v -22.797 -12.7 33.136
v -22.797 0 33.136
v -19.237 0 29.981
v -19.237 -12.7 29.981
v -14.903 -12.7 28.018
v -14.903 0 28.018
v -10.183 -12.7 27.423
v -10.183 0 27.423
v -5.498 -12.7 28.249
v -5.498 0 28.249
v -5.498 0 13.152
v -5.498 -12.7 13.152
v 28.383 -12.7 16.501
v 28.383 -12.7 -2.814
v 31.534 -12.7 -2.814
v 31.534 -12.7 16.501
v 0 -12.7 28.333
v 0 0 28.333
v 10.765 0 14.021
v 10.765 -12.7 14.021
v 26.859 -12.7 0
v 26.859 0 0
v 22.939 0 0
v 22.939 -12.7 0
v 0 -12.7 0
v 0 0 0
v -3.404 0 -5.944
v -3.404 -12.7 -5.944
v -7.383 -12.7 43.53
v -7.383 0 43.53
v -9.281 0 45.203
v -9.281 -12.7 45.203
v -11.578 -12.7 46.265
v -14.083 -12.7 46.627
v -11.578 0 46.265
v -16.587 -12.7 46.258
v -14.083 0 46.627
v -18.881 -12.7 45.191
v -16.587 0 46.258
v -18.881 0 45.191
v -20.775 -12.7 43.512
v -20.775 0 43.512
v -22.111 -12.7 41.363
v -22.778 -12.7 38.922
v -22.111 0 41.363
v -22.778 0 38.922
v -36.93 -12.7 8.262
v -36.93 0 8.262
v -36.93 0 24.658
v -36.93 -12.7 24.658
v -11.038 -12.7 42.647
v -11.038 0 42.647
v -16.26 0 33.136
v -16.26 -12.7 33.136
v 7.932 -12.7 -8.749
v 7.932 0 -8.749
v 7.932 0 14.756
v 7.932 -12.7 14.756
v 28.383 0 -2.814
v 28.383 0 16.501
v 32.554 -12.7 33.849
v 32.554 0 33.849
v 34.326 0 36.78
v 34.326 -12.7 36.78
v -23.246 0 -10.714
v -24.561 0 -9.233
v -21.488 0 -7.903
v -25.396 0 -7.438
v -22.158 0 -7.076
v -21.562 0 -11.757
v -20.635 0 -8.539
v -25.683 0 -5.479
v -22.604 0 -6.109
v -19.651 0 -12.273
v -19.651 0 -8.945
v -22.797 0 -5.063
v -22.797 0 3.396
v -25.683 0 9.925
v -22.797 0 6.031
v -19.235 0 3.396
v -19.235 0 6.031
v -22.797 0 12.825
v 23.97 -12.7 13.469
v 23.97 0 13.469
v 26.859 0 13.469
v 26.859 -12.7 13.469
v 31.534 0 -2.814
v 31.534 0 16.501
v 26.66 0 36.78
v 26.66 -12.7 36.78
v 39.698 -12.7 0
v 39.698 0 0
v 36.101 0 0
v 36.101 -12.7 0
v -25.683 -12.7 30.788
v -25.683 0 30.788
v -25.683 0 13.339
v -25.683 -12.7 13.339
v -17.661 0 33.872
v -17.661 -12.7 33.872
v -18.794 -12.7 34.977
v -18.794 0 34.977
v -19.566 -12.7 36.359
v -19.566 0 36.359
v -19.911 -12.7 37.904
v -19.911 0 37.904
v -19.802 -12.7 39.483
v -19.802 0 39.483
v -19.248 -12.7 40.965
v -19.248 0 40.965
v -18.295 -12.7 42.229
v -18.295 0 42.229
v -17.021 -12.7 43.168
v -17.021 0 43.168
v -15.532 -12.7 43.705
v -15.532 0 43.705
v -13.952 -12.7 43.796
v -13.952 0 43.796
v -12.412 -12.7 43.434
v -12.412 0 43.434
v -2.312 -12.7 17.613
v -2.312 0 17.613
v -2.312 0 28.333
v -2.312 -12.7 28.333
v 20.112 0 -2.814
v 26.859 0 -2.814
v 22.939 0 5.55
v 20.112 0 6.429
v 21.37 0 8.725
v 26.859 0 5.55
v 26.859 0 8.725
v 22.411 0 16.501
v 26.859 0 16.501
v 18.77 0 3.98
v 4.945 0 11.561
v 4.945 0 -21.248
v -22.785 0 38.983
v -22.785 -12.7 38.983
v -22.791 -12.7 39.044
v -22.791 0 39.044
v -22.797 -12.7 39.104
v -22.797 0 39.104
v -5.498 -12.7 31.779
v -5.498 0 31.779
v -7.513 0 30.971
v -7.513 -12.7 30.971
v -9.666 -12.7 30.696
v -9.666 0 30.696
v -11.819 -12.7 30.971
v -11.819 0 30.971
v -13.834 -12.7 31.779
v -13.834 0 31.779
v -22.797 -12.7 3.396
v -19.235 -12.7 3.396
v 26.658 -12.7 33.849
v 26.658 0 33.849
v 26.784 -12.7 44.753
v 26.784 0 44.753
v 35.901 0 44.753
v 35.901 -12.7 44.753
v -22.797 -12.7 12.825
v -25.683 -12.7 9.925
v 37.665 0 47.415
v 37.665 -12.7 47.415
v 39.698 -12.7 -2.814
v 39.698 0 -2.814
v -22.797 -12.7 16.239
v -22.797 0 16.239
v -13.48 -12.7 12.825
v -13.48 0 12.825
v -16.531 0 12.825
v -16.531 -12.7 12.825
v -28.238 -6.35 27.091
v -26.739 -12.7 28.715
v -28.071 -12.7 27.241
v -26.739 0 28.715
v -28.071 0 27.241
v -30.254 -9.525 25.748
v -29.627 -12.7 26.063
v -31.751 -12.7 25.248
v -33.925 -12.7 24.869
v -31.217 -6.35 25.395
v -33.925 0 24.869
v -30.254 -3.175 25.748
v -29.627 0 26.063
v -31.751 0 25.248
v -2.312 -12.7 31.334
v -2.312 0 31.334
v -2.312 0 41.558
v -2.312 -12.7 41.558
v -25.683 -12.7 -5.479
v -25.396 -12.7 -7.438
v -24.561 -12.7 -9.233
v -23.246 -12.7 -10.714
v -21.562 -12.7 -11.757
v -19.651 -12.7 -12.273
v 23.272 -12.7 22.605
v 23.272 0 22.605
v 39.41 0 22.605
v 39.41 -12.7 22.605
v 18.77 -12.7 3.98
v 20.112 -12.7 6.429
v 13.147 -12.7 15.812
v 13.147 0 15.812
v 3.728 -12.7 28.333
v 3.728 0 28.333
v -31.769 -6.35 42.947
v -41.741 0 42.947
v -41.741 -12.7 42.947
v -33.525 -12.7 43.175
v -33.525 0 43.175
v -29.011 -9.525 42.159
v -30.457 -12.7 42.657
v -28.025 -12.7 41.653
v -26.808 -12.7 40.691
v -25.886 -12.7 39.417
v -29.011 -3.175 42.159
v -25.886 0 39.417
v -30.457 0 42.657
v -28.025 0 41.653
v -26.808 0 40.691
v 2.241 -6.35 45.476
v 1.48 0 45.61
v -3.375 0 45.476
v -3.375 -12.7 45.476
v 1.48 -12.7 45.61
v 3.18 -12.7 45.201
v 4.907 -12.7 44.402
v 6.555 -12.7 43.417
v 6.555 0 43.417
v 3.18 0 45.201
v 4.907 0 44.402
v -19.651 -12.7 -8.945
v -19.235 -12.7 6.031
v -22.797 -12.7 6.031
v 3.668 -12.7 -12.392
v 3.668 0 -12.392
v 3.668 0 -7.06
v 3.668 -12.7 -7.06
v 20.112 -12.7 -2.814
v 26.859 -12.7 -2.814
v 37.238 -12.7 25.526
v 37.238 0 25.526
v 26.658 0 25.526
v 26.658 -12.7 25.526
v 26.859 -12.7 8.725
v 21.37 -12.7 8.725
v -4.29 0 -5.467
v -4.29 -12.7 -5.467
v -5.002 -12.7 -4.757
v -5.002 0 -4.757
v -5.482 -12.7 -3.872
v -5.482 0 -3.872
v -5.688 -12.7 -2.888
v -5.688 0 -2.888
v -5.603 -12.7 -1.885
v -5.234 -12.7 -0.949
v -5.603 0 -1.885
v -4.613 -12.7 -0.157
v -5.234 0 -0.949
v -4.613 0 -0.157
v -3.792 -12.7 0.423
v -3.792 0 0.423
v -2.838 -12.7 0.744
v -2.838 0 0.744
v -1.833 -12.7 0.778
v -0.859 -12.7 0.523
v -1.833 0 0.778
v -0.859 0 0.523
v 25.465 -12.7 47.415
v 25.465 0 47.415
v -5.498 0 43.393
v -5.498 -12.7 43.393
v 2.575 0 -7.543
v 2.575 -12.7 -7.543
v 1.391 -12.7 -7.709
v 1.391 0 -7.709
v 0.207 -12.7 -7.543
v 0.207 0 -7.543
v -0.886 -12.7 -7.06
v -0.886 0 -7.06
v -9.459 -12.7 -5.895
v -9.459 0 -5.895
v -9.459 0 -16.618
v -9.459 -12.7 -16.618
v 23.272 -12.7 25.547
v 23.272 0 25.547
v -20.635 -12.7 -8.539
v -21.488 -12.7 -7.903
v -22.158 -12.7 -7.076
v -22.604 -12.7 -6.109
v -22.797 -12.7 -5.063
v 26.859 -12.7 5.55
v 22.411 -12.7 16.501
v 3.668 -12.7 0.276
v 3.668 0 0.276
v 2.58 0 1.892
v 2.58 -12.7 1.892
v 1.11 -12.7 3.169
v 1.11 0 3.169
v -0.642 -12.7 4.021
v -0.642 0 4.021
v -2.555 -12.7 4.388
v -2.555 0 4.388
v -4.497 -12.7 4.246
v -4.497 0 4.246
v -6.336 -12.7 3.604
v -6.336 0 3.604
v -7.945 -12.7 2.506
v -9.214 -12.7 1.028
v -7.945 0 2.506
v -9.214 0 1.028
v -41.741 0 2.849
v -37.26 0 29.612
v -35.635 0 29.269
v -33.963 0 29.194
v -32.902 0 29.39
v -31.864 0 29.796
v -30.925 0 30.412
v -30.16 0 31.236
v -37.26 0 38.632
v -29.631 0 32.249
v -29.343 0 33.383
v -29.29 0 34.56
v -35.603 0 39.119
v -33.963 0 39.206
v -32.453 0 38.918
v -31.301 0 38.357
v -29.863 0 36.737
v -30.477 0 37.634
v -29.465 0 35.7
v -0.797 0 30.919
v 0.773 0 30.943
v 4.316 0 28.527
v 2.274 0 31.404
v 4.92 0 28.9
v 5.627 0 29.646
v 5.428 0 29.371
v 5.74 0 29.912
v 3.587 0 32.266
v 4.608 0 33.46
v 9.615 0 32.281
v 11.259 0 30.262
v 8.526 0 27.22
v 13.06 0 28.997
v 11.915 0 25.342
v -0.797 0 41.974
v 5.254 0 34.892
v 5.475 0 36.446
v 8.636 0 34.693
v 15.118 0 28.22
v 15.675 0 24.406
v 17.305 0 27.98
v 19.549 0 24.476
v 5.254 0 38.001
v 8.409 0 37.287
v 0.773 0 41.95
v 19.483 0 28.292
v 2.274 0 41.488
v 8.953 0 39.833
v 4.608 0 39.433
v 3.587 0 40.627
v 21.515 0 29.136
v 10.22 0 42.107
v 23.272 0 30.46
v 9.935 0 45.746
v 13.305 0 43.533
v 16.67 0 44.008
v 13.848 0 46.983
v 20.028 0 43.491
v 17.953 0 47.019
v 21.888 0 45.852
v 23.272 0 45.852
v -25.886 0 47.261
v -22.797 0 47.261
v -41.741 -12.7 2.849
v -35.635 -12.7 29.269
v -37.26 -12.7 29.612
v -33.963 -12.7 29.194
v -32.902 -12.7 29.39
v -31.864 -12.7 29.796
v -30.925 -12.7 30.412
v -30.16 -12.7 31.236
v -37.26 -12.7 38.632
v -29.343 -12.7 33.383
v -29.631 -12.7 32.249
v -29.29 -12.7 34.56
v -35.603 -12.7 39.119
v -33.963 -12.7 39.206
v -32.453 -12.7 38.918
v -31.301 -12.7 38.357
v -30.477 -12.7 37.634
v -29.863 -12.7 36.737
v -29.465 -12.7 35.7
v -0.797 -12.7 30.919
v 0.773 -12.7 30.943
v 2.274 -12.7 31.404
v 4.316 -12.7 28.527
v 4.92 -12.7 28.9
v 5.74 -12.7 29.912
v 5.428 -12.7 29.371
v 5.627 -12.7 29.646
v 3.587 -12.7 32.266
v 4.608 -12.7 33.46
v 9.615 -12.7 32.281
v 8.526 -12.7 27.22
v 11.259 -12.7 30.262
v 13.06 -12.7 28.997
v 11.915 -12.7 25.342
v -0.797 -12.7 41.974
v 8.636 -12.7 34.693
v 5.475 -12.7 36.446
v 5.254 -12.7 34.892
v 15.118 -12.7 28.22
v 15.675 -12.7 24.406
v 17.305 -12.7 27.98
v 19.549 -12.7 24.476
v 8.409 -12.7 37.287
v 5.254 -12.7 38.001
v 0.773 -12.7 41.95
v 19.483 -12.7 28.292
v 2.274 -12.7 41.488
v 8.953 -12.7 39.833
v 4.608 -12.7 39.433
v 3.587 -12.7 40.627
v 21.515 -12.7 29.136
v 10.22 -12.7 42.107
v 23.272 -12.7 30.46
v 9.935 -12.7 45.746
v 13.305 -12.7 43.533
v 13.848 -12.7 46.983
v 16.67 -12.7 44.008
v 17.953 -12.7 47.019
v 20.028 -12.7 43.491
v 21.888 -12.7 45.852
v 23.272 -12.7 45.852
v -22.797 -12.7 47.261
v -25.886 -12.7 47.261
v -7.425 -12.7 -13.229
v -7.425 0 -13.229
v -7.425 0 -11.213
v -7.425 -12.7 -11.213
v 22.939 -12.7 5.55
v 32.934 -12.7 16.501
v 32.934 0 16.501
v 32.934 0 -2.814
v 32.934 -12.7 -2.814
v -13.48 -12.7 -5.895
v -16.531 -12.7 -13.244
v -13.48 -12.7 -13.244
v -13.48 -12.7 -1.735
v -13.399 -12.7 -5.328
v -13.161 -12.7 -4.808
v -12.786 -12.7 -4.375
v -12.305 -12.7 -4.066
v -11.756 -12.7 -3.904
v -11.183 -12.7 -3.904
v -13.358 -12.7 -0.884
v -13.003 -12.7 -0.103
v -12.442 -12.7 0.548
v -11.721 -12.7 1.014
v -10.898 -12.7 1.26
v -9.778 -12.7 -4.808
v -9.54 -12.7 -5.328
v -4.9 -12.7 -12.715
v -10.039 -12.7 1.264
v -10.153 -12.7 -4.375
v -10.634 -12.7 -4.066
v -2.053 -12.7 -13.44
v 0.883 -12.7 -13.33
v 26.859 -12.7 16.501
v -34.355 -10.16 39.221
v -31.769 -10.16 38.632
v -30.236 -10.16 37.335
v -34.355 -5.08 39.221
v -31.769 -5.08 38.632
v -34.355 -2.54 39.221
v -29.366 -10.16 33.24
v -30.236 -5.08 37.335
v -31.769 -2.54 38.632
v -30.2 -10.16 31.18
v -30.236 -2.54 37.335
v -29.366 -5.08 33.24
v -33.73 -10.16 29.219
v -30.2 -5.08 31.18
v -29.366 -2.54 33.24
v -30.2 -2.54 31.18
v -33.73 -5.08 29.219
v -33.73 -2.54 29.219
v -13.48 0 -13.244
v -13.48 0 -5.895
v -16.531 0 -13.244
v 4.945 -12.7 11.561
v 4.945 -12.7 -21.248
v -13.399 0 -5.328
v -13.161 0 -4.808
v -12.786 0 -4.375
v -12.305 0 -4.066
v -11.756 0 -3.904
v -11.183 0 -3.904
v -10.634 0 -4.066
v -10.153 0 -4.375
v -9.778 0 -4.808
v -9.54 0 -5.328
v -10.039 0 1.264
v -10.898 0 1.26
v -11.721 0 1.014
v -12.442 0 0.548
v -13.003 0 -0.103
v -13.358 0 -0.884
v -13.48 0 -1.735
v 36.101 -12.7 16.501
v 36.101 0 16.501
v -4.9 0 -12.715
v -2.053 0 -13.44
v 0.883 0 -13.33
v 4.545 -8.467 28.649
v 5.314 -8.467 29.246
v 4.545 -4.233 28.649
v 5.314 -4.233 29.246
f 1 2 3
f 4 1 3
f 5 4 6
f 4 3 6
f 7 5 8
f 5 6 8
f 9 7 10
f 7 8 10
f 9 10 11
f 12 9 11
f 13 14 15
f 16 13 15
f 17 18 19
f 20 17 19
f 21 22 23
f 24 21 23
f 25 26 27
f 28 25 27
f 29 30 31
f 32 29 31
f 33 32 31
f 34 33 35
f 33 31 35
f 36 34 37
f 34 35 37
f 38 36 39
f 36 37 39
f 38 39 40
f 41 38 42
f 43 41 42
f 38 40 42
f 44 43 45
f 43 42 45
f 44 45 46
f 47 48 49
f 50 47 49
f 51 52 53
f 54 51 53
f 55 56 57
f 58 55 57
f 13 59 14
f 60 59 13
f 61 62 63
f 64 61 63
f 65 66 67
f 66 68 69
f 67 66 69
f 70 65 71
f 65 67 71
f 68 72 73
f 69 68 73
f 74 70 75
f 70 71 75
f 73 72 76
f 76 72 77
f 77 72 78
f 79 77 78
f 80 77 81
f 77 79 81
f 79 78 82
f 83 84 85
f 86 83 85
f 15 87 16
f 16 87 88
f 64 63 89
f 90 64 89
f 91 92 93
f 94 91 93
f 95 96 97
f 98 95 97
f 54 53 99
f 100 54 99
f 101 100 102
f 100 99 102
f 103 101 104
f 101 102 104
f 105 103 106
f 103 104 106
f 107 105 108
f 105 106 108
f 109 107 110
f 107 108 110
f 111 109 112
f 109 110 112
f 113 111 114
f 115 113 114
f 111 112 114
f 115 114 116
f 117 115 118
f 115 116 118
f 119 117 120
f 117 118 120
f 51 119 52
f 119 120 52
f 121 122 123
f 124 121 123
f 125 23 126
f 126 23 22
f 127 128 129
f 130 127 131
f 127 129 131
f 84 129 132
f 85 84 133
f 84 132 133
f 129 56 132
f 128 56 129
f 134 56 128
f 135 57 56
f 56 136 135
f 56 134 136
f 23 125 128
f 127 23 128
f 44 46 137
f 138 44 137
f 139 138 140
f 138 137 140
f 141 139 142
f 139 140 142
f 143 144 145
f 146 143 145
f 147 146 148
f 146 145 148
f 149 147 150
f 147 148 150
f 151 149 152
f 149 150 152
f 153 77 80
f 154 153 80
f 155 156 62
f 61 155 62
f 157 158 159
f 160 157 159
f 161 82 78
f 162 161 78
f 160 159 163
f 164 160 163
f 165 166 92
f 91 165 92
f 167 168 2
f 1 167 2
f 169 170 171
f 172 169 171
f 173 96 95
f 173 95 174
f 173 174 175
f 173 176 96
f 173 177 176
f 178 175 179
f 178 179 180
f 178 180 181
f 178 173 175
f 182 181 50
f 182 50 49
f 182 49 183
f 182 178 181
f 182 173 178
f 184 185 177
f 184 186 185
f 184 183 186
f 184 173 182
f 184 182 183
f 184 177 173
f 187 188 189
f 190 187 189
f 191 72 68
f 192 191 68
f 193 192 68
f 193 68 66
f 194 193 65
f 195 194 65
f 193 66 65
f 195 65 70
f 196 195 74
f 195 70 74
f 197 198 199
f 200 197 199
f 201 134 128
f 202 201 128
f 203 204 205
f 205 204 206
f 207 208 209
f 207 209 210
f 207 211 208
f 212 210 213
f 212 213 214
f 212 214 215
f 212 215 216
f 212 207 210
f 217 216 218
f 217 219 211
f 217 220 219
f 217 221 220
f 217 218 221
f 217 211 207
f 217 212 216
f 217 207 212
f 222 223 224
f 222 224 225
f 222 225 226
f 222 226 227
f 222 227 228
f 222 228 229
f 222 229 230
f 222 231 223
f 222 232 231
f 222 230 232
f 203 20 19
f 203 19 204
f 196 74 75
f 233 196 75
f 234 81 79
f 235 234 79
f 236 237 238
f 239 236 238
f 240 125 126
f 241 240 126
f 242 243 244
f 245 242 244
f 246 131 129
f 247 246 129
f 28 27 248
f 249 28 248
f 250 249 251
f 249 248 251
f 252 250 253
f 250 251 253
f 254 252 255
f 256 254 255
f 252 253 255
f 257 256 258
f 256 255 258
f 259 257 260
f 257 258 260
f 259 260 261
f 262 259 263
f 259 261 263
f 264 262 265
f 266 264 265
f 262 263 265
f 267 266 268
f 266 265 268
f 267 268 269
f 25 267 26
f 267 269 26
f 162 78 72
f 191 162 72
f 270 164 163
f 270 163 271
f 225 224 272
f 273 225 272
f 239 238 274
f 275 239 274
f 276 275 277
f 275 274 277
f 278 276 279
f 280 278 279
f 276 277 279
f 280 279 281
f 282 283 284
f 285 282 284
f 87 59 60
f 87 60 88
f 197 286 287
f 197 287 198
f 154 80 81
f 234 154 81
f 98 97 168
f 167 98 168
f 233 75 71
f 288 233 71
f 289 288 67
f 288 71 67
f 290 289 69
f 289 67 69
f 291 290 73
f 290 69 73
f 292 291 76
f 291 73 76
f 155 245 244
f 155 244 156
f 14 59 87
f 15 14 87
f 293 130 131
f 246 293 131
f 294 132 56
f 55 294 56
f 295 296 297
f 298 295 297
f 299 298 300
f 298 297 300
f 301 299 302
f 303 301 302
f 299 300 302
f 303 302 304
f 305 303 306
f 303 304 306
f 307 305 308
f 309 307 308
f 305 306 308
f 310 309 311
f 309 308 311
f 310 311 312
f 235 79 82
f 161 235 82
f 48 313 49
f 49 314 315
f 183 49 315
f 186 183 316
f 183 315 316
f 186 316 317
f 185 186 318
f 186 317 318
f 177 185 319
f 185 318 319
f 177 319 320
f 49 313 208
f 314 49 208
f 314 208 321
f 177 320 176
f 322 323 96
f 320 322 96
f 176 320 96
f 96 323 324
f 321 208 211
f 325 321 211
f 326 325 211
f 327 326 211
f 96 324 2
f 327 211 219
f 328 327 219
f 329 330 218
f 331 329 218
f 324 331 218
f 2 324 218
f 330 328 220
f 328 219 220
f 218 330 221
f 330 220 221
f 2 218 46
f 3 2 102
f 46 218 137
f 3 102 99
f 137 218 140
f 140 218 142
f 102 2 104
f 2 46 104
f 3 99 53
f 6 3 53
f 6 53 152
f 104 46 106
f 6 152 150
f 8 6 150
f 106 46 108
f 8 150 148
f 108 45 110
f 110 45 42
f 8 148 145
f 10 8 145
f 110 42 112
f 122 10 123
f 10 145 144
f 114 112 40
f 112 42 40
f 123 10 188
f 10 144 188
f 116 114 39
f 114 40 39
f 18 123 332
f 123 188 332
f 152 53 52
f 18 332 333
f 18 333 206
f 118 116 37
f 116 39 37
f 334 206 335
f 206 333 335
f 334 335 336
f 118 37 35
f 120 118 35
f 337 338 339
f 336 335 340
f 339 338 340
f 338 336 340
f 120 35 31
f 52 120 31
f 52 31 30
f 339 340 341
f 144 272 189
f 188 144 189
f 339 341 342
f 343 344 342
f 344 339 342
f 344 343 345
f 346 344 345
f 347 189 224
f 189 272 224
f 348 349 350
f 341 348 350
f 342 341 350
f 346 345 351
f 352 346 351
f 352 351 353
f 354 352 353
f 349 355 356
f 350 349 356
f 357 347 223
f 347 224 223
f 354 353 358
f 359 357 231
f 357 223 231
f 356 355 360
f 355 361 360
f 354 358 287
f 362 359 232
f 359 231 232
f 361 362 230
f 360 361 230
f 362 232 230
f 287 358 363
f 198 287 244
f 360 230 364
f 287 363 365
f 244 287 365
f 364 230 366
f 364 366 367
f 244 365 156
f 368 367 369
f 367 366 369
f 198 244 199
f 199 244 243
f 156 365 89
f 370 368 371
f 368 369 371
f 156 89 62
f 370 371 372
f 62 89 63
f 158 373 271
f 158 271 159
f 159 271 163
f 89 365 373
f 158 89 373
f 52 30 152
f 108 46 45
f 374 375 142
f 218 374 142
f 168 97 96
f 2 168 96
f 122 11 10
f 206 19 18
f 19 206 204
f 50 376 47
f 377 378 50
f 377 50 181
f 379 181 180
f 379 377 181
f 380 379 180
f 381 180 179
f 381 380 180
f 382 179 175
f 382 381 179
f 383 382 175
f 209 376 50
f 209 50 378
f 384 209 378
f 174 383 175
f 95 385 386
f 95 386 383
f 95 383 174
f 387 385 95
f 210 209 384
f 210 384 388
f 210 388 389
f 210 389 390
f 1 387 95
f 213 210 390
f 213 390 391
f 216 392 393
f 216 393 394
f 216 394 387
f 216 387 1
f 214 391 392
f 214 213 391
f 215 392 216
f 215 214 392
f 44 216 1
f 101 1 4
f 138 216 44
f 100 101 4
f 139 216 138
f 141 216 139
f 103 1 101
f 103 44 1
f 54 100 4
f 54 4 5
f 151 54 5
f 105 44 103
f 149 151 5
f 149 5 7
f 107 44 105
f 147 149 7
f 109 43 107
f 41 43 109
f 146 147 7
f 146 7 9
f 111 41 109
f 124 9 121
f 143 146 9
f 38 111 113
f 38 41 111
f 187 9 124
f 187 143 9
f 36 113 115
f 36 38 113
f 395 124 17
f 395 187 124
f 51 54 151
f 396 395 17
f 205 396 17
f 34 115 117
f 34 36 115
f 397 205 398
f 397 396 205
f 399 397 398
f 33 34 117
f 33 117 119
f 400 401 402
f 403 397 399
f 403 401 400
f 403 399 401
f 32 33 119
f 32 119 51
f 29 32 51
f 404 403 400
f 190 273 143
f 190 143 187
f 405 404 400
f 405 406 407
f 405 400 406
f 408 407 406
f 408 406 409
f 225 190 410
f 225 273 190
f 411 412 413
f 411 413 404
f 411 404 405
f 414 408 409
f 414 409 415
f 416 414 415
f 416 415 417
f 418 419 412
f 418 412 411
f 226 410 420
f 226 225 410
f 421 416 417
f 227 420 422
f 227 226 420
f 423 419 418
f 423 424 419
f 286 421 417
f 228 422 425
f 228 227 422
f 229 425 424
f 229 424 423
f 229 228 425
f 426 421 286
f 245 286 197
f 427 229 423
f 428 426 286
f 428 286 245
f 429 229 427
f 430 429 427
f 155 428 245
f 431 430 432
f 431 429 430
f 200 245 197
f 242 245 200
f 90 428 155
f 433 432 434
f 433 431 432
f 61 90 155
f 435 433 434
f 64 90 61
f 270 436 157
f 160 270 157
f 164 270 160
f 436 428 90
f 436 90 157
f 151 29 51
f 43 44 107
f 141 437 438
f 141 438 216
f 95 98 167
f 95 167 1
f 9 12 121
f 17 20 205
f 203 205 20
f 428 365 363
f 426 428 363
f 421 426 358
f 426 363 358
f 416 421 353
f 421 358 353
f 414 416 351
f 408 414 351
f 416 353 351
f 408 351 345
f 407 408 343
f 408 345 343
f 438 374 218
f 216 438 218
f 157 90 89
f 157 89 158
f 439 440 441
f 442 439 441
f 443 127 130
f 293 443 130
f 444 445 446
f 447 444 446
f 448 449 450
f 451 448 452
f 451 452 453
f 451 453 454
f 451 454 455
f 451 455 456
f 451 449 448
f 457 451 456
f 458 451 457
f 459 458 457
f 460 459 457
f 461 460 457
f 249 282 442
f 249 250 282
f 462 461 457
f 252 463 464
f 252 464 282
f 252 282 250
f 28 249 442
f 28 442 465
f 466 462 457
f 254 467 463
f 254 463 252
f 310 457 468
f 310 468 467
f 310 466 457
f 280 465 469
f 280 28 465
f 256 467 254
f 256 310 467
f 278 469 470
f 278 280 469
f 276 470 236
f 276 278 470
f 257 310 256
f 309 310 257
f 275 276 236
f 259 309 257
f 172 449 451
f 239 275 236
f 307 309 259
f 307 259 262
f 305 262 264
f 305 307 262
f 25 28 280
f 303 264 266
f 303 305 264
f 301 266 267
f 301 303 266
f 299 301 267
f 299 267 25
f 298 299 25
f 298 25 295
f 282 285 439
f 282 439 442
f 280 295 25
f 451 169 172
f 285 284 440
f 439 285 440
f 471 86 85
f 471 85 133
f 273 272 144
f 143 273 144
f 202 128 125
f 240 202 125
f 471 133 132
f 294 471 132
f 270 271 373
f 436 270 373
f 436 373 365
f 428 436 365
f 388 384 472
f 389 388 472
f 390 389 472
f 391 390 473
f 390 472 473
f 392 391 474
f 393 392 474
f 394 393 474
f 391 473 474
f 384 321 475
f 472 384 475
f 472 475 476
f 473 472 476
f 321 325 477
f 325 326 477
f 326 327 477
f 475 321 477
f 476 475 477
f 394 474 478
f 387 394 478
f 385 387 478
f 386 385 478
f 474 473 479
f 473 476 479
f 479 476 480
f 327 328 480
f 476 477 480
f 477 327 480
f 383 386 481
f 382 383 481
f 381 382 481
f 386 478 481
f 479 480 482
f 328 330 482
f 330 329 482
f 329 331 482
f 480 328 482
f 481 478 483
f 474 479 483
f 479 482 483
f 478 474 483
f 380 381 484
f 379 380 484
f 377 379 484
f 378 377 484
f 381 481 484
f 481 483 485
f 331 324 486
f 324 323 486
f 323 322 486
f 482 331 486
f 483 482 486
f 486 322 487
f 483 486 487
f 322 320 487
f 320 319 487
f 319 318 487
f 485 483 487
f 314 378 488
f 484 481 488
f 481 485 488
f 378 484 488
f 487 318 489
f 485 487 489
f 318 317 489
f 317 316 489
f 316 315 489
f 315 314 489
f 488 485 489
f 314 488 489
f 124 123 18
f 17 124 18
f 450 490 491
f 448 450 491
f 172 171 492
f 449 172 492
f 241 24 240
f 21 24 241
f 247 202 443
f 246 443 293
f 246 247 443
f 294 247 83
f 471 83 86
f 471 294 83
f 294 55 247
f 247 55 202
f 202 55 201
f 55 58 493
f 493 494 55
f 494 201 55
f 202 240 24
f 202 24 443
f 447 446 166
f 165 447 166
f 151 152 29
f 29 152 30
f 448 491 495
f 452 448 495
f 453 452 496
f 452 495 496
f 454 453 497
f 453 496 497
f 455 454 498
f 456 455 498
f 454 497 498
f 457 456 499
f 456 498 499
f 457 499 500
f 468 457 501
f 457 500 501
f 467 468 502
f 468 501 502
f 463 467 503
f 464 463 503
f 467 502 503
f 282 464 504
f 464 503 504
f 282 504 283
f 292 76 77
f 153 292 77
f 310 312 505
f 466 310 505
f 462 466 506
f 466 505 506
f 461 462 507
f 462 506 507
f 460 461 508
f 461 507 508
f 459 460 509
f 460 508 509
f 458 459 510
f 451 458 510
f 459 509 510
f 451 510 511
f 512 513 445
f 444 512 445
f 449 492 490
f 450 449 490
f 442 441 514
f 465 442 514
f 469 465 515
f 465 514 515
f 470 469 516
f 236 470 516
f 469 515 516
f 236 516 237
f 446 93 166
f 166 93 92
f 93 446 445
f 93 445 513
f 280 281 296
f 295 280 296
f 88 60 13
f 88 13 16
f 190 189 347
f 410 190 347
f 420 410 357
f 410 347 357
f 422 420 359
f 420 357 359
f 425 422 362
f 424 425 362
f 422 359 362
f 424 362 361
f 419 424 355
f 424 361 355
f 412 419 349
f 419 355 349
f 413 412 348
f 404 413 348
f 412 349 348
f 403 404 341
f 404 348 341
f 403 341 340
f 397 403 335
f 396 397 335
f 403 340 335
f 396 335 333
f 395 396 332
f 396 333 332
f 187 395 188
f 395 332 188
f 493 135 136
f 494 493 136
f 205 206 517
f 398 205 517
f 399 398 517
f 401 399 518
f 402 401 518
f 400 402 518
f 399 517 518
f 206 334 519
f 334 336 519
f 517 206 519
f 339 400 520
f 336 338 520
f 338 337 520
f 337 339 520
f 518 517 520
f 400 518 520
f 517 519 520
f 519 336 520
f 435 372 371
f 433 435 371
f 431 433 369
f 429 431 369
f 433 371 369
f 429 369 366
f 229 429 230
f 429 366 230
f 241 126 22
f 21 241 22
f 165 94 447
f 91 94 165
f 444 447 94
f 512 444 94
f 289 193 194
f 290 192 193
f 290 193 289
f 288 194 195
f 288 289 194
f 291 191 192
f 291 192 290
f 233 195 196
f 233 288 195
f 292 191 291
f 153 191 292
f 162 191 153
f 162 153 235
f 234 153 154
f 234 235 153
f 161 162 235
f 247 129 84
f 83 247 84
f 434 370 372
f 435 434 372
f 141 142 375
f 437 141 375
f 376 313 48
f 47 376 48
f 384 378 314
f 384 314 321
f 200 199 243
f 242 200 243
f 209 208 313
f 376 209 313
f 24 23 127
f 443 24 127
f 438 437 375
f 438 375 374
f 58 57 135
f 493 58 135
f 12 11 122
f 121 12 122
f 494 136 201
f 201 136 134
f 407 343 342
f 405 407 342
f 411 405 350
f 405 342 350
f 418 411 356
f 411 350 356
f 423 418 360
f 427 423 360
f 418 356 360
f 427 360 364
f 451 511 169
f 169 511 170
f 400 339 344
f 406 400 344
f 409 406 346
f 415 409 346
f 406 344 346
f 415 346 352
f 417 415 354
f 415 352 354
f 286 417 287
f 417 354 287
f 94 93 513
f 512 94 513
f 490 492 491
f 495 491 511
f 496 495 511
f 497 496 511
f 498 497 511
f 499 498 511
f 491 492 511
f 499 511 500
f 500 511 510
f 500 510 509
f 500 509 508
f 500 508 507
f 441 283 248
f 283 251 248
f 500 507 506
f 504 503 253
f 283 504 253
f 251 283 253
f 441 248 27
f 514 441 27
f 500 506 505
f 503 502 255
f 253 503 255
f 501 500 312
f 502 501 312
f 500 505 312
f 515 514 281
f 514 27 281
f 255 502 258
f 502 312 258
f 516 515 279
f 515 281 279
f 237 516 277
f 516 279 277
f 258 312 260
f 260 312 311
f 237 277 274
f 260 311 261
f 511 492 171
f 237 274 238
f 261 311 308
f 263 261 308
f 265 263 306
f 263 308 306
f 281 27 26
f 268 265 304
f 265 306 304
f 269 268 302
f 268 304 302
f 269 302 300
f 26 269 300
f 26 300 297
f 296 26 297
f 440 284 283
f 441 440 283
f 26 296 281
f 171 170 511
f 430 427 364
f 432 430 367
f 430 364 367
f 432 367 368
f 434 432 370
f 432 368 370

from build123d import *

# Parameters (mm, degrees)
F1_DEPTH = 12.7
F0_W     = 3.1512789428
F0_H     = 19.3154485896


# Not quite as in the source:
# - a feature names something its author has since deleted; it is built from what else it names


with BuildPart() as f1:
    # F0 (on Front) → F1 (new body)
    with BuildSketch(Plane.XZ):
        with BuildLine():
            Line((-22.7970443666, 6.0306531377), (-22.7970443666, 12.8252729774))
            Line((-22.7970443666, 12.8252729774), (-25.6827417761, 9.9253003924))
            Line((-25.6827417761, 9.9253003924), (-25.6827417761, -5.4786019027))
            ThreePointArc((-25.6827417761, -5.4786019027), (-23.9571856116, -10.0214915962), (-19.6507833898, -12.273222208))
            Line((-19.6507833898, -12.273222208), (-19.6507833898, -8.9452452958))
            ThreePointArc((-19.6507833898, -8.9452452958), (-21.848929, -7.5103998354), (-22.7970443666, -5.062604323))
            Line((-22.7970443666, -5.062604323), (-22.7970443666, 3.3960044384))
            Line((-22.7970443666, 3.3960044384), (-19.2347858101, 3.3960044384))
            Line((-19.2347858101, 3.3960044384), (-19.2347858101, 6.0306531377))
            Line((-19.2347858101, 6.0306531377), (-22.7970443666, 6.0306531377))
        make_face()
    extrude(amount=F1_DEPTH)


with BuildPart() as f1b:
    # F0 (on Front) → F1, piece 2 (new body)
    with BuildSketch(Plane.XZ):
        with Locations((29.9587789923, 6.84329262)):
            Rectangle(F0_W, F0_H)
    extrude(amount=F1_DEPTH)


with BuildPart() as f1c:
    # F0 (on Front) → F1, piece 3 (new body)
    with BuildSketch(Plane.XZ):
        Polygon((36.1009687185, 16.5010169148), (32.9344682395, 16.5010169148), (32.9344682395, -2.8144316748), (39.6982617676, -2.8144316748), (39.6982617676, 0), (36.1009687185, 0), align=None)
    extrude(amount=F1_DEPTH)


with BuildPart() as f1d:
    # F0 (on Front) → F1, piece 4 (new body)
    with BuildSketch(Plane.XZ):
        Polygon((23.2723504305, 45.8521991968), (23.2723504305, 30.4596498609), (23.2723504305, 25.5465842783), (23.2723504305, 22.6054359227), (39.4099989739, 22.6054359227), (37.2384806324, 25.5261287093), (26.6575552523, 25.5261287093), (26.6575552523, 33.8493175805), (32.5542018329, 33.8493175805), (34.3258168194, 36.7803946137), (26.6601163894, 36.7803946137), (26.783708483, 44.7525680065), (35.9011446557, 44.7525680065), (37.6653889506, 47.4146641791), (25.4651047289, 47.4146641791), align=None)
        with BuildLine():
            ThreePointArc((-22.7784111307, 38.9221281908), (-22.7881290805, 39.0132098974), (-22.7970443666, 39.1043736704))
            Line((-22.7970443666, 39.1043736704), (-22.7970443666, 38.7572443403))
            ThreePointArc((-22.7970443666, 38.7572443403), (-22.7881176358, 38.839730326), (-22.7784111307, 38.9221281908))
        make_face()
        with BuildLine():
            Line((-25.8855894208, 47.2608096898), (-25.8855894208, 39.4166894257))
            add(Edge.make_bspline(
                [(-25.8855894208, 39.4166894257), (-24.6475112984, 37.0445040507), (-24.8416415293, 33.227538681), (-25.6827417761, 30.7881627232)],
                knots=[0.4174478971, 0.4174478971, 0.4174478971, 0.4174478971, 0.6297294882, 0.6297294882, 0.6297294882, 0.6297294882], degree=3))
            Line((-25.6827417761, 30.7881627232), (-25.6827417761, 13.3388286385))
            Line((-25.6827417761, 13.3388286385), (-22.7970443666, 16.2388012235))
            Line((-22.7970443666, 16.2388012235), (-22.7970443666, 33.1357669485))
            Line((-22.7970443666, 33.1357669485), (-22.7970443666, 38.7572443403))
            Line((-22.7970443666, 38.7572443403), (-22.7970443666, 39.1043736704))
            Line((-22.7970443666, 39.1043736704), (-22.7970443666, 47.2608096898))
            Line((-22.7970443666, 47.2608096898), (-25.8855894208, 47.2608096898))
        make_face()
        with BuildLine():
            Line((-5.4981587455, 31.7787639797), (-5.4981587455, 28.2489098608))
            Line((-5.4981587455, 28.2489098608), (-5.4981587455, 13.1524559511))
            Line((-5.4981587455, 13.1524559511), (-2.3118001409, 17.6133587109))
            Line((-2.3118001409, 17.6133587109), (-2.3118001409, 28.3327493817))
            Line((-2.3118001409, 28.3327493817), (0, 28.3327493817))
            Line((0, 28.3327493817), (10.7654773061, 14.0205014217))
            Line((10.7654773061, 14.0205014217), (13.1465570685, 15.8115170761))
            Line((13.1465570685, 15.8115170761), (3.7282572594, 28.3327493817))
            add(Edge.make_bspline(
                [(3.7282572594, 28.3327493817), (4.4697086138, 28.4388605505), (5.583407823, 29.2809382081), (5.7398658246, 29.9119707197)],
                knots=[0, 0, 0, 0, 2.5574418965, 2.5574418965, 2.5574418965, 2.5574418965], degree=3))
            ThreePointArc((5.7398658246, 29.9119707197), (13.7644057738, 24.750415198), (23.2723504305, 25.5465842783))
            Line((23.2723504305, 25.5465842783), (23.2723504305, 30.4596498609))
            ThreePointArc((23.2723504305, 30.4596498609), (17.3050239314, 27.9801992486), (11.2593770027, 30.2620436996))
            ThreePointArc((11.2593770027, 30.2620436996), (8.4255284864, 35.9813750755), (10.2200610563, 42.1068221331))
            ThreePointArc((10.2200610563, 42.1068221331), (14.969664999, 43.8937045235), (20.0282521546, 43.4907376766))
            Line((20.0282521546, 43.4907376766), (21.8875091523, 45.8521991968))
            ThreePointArc((21.8875091523, 45.8521991968), (13.848280603, 46.9825580852), (6.554979831, 43.4167943895))
            add(Edge.make_bspline(
                [(-3.3745283409, 45.4758740962), (-1.4213463889, 45.669322552), (2.3339933507, 46.0412616194), (5.1862192298, 44.2678436312), (6.554979831, 43.4167943895)],
                knots=[0, 0, 0, 0, 0.520107923, 1, 1, 1, 1], degree=3))
            Line((-3.3745283409, 45.4758740962), (-5.4981587455, 43.3934754007))
            Line((-5.4981587455, 43.3934754007), (-5.4981587455, 31.7787639797))
        make_face()
        with BuildLine():
            Line((-2.3118001409, 31.334426254), (-2.3118001409, 41.5583662689))
            ThreePointArc((-2.3118001409, 41.5583662689), (5.4753586279, 36.4463962615), (-2.3118001409, 31.334426254))
        make_face(mode=Mode.SUBTRACT)
        with BuildLine():
            Line((-22.7970443666, 38.7572443403), (-22.7970443666, 33.1357669485))
            ThreePointArc((-22.7970443666, 33.1357669485), (-14.9031259742, 28.0178729436), (-5.4981587455, 28.2489098608))
            Line((-5.4981587455, 28.2489098608), (-5.4981587455, 31.7787639797))
            ThreePointArc((-5.4981587455, 31.7787639797), (-9.6662566066, 30.6964517708), (-13.8343544677, 31.7787639797))
            Line((-13.8343544677, 31.7787639797), (-7.3829540052, 43.5297638178))
            ThreePointArc((-7.3829540052, 43.5297638178), (-16.5867906437, 46.2582932174), (-22.7784111307, 38.9221281908))
            ThreePointArc((-22.7784111307, 38.9221281908), (-22.7881176358, 38.839730326), (-22.7970443666, 38.7572443403))
        make_face()
        with BuildLine():
            ThreePointArc((-16.2602435866, 33.1357669485), (-19.2483695666, 40.9652958819), (-11.0384837145, 42.6470195468))
            Line((-11.0384837145, 42.6470195468), (-16.2602435866, 33.1357669485))
        make_face(mode=Mode.SUBTRACT)
        with BuildLine():
            add(Edge.make_bspline(
                [(-41.7409986258, 42.9465435445), (-38.3140280434, 43.2744605369), (-31.9351392412, 43.6634452288), (-26.9894319336, 41.5316763702), (-25.8855894208, 39.4166894257)],
                knots=[0, 0, 0, 0, 0.2281824212, 0.4174478971, 0.4174478971, 0.4174478971, 0.4174478971], degree=3))
            Line((-41.7409986258, 42.9465435445), (-41.7409986258, 2.8491741978))
            Line((-41.7409986258, 2.8491741978), (-36.929551512, 8.2620496761))
            Line((-36.929551512, 8.2620496761), (-36.929551512, 24.6575884521))
            add(Edge.make_bspline(
                [(-25.6827417761, 30.7881627232), (-26.2896941154, 29.0278672654), (-28.5711016827, 26.5069421654), (-31.2054829086, 24.8549701927), (-36.929551512, 24.6575884521)],
                knots=[0.6297294882, 0.6297294882, 0.6297294882, 0.6297294882, 0.782915519, 1, 1, 1, 1], degree=3))
            add(Edge.make_bspline(
                [(-25.8855894208, 39.4166894257), (-24.6475112984, 37.0445040507), (-24.8416415293, 33.227538681), (-25.6827417761, 30.7881627232)],
                knots=[0.4174478971, 0.4174478971, 0.4174478971, 0.4174478971, 0.6297294882, 0.6297294882, 0.6297294882, 0.6297294882], degree=3))
        make_face()
        with BuildLine():
            Line((-37.2595600784, 29.6115428209), (-37.2595600784, 38.6322811246))
            add(Edge.make_bspline(
                [(-37.2595600784, 38.6322811246), (-35.3561267257, 39.4460260868), (-31.466902181, 39.3385766394), (-28.8684550726, 35.6553912172), (-29.5715392632, 30.735591869), (-33.7296713515, 28.7688764356), (-36.1080948778, 29.3355701334), (-37.2595600784, 29.6115428209)],
                knots=[0, 0, 0, 0, 0.2272418181, 0.4192961801, 0.62236893, 0.8172414567, 1, 1, 1, 1], degree=3))
        make_face(mode=Mode.SUBTRACT)
    extrude(amount=F1_DEPTH)


with BuildPart() as f1e:
    # F0 (on Front) → F1, piece 5 (new body)
    with BuildSketch(Plane.XZ):
        with BuildLine():
            Line((-16.5308043361, 12.8252729774), (-16.5308043361, 6.0306531377))
            Line((-16.5308043361, 6.0306531377), (-16.5308043361, -13.2438829169))
            Line((-16.5308043361, -13.2438829169), (-13.480159454, -13.2438829169))
            Line((-13.480159454, -13.2438829169), (-13.480159454, -5.8945985511))
            ThreePointArc((-13.480159454, -5.8945985511), (-11.469506193, -3.88394529), (-9.4588529319, -5.8945985511))
            Line((-9.4588529319, -5.8945985511), (-9.4588529319, -16.6180811874))
            Line((-9.4588529319, -16.6180811874), (-7.4251685292, -13.2286085109))
            Line((-7.4251685292, -13.2286085109), (-7.4251685292, -11.2130781636))
            Line((-7.4251685292, -11.2130781636), (-7.4251685292, -1.7346271779))
            ThreePointArc((-7.4251685292, -1.7346271779), (-7.9112814974, -0.0892993099), (-9.2135139302, 1.027660986))
            ThreePointArc((-9.2135139302, 1.027660986), (-12.0979918597, 0.8067553162), (-13.480159454, -1.7346271779))
            Line((-13.480159454, -1.7346271779), (-13.480159454, 12.8252729774))
            Line((-13.480159454, 12.8252729774), (-16.5308043361, 12.8252729774))
        make_face()
        with BuildLine():
            ThreePointArc((3.6680903286, 0.2758637036), (-2.5546550581, 4.3880363795), (-9.2135139302, 1.027660986))
            ThreePointArc((-9.2135139302, 1.027660986), (-7.9112814974, -0.0892993099), (-7.4251685292, -1.7346271779))
            Line((-7.4251685292, -1.7346271779), (-7.4251685292, -11.2130781636))
            ThreePointArc((-7.4251685292, -11.2130781636), (-2.0526030127, -13.4402072341), (3.6680903286, -12.3922416719))
            Line((3.6680903286, -12.3922416719), (3.6680903286, -7.0596027459))
            ThreePointArc((3.6680903286, -7.0596027459), (1.3911641285, -7.7088893182), (-0.8857620715, -7.0596027459))
            Line((-0.8857620715, -7.0596027459), (3.6680903286, 0.2758637036))
        make_face()
        with BuildLine():
            Line((0, 0), (-3.4038629383, -5.9437802993))
            ThreePointArc((-3.4038629383, -5.9437802993), (-5.2343312263, -0.9489680342), (0, 0))
        make_face(mode=Mode.SUBTRACT)
    extrude(amount=F1_DEPTH)


with BuildPart() as f1f:
    # F0 (on Front) → F1, piece 6 (new body)
    with BuildSketch(Plane.XZ):
        Polygon((26.8592257053, 16.5010169148), (22.4110993379, 16.5010169148), (7.9316468909, -8.7489113212), (7.9316468909, 14.7557211396), (4.9446239136, 11.5606354574), (4.9446239136, -21.2484076619), (18.7698199886, 3.9802147076), (20.1118197292, 6.4291351057), (20.1118197292, -2.8144316748), (26.8592257053, -2.8144316748), (26.8592257053, 0), (22.9392815381, 0), (22.9392815381, 5.5498266593), (26.8592257053, 5.5498266593), (26.8592257053, 8.7248175405), (21.3698456064, 8.7248175405), (23.9698712242, 13.4694203734), (26.8592257053, 13.4694203734), align=None)
    extrude(amount=F1_DEPTH)


solid = Compound([f1.part, f1b.part, f1c.part, f1d.part, f1e.part, f1f.part])
